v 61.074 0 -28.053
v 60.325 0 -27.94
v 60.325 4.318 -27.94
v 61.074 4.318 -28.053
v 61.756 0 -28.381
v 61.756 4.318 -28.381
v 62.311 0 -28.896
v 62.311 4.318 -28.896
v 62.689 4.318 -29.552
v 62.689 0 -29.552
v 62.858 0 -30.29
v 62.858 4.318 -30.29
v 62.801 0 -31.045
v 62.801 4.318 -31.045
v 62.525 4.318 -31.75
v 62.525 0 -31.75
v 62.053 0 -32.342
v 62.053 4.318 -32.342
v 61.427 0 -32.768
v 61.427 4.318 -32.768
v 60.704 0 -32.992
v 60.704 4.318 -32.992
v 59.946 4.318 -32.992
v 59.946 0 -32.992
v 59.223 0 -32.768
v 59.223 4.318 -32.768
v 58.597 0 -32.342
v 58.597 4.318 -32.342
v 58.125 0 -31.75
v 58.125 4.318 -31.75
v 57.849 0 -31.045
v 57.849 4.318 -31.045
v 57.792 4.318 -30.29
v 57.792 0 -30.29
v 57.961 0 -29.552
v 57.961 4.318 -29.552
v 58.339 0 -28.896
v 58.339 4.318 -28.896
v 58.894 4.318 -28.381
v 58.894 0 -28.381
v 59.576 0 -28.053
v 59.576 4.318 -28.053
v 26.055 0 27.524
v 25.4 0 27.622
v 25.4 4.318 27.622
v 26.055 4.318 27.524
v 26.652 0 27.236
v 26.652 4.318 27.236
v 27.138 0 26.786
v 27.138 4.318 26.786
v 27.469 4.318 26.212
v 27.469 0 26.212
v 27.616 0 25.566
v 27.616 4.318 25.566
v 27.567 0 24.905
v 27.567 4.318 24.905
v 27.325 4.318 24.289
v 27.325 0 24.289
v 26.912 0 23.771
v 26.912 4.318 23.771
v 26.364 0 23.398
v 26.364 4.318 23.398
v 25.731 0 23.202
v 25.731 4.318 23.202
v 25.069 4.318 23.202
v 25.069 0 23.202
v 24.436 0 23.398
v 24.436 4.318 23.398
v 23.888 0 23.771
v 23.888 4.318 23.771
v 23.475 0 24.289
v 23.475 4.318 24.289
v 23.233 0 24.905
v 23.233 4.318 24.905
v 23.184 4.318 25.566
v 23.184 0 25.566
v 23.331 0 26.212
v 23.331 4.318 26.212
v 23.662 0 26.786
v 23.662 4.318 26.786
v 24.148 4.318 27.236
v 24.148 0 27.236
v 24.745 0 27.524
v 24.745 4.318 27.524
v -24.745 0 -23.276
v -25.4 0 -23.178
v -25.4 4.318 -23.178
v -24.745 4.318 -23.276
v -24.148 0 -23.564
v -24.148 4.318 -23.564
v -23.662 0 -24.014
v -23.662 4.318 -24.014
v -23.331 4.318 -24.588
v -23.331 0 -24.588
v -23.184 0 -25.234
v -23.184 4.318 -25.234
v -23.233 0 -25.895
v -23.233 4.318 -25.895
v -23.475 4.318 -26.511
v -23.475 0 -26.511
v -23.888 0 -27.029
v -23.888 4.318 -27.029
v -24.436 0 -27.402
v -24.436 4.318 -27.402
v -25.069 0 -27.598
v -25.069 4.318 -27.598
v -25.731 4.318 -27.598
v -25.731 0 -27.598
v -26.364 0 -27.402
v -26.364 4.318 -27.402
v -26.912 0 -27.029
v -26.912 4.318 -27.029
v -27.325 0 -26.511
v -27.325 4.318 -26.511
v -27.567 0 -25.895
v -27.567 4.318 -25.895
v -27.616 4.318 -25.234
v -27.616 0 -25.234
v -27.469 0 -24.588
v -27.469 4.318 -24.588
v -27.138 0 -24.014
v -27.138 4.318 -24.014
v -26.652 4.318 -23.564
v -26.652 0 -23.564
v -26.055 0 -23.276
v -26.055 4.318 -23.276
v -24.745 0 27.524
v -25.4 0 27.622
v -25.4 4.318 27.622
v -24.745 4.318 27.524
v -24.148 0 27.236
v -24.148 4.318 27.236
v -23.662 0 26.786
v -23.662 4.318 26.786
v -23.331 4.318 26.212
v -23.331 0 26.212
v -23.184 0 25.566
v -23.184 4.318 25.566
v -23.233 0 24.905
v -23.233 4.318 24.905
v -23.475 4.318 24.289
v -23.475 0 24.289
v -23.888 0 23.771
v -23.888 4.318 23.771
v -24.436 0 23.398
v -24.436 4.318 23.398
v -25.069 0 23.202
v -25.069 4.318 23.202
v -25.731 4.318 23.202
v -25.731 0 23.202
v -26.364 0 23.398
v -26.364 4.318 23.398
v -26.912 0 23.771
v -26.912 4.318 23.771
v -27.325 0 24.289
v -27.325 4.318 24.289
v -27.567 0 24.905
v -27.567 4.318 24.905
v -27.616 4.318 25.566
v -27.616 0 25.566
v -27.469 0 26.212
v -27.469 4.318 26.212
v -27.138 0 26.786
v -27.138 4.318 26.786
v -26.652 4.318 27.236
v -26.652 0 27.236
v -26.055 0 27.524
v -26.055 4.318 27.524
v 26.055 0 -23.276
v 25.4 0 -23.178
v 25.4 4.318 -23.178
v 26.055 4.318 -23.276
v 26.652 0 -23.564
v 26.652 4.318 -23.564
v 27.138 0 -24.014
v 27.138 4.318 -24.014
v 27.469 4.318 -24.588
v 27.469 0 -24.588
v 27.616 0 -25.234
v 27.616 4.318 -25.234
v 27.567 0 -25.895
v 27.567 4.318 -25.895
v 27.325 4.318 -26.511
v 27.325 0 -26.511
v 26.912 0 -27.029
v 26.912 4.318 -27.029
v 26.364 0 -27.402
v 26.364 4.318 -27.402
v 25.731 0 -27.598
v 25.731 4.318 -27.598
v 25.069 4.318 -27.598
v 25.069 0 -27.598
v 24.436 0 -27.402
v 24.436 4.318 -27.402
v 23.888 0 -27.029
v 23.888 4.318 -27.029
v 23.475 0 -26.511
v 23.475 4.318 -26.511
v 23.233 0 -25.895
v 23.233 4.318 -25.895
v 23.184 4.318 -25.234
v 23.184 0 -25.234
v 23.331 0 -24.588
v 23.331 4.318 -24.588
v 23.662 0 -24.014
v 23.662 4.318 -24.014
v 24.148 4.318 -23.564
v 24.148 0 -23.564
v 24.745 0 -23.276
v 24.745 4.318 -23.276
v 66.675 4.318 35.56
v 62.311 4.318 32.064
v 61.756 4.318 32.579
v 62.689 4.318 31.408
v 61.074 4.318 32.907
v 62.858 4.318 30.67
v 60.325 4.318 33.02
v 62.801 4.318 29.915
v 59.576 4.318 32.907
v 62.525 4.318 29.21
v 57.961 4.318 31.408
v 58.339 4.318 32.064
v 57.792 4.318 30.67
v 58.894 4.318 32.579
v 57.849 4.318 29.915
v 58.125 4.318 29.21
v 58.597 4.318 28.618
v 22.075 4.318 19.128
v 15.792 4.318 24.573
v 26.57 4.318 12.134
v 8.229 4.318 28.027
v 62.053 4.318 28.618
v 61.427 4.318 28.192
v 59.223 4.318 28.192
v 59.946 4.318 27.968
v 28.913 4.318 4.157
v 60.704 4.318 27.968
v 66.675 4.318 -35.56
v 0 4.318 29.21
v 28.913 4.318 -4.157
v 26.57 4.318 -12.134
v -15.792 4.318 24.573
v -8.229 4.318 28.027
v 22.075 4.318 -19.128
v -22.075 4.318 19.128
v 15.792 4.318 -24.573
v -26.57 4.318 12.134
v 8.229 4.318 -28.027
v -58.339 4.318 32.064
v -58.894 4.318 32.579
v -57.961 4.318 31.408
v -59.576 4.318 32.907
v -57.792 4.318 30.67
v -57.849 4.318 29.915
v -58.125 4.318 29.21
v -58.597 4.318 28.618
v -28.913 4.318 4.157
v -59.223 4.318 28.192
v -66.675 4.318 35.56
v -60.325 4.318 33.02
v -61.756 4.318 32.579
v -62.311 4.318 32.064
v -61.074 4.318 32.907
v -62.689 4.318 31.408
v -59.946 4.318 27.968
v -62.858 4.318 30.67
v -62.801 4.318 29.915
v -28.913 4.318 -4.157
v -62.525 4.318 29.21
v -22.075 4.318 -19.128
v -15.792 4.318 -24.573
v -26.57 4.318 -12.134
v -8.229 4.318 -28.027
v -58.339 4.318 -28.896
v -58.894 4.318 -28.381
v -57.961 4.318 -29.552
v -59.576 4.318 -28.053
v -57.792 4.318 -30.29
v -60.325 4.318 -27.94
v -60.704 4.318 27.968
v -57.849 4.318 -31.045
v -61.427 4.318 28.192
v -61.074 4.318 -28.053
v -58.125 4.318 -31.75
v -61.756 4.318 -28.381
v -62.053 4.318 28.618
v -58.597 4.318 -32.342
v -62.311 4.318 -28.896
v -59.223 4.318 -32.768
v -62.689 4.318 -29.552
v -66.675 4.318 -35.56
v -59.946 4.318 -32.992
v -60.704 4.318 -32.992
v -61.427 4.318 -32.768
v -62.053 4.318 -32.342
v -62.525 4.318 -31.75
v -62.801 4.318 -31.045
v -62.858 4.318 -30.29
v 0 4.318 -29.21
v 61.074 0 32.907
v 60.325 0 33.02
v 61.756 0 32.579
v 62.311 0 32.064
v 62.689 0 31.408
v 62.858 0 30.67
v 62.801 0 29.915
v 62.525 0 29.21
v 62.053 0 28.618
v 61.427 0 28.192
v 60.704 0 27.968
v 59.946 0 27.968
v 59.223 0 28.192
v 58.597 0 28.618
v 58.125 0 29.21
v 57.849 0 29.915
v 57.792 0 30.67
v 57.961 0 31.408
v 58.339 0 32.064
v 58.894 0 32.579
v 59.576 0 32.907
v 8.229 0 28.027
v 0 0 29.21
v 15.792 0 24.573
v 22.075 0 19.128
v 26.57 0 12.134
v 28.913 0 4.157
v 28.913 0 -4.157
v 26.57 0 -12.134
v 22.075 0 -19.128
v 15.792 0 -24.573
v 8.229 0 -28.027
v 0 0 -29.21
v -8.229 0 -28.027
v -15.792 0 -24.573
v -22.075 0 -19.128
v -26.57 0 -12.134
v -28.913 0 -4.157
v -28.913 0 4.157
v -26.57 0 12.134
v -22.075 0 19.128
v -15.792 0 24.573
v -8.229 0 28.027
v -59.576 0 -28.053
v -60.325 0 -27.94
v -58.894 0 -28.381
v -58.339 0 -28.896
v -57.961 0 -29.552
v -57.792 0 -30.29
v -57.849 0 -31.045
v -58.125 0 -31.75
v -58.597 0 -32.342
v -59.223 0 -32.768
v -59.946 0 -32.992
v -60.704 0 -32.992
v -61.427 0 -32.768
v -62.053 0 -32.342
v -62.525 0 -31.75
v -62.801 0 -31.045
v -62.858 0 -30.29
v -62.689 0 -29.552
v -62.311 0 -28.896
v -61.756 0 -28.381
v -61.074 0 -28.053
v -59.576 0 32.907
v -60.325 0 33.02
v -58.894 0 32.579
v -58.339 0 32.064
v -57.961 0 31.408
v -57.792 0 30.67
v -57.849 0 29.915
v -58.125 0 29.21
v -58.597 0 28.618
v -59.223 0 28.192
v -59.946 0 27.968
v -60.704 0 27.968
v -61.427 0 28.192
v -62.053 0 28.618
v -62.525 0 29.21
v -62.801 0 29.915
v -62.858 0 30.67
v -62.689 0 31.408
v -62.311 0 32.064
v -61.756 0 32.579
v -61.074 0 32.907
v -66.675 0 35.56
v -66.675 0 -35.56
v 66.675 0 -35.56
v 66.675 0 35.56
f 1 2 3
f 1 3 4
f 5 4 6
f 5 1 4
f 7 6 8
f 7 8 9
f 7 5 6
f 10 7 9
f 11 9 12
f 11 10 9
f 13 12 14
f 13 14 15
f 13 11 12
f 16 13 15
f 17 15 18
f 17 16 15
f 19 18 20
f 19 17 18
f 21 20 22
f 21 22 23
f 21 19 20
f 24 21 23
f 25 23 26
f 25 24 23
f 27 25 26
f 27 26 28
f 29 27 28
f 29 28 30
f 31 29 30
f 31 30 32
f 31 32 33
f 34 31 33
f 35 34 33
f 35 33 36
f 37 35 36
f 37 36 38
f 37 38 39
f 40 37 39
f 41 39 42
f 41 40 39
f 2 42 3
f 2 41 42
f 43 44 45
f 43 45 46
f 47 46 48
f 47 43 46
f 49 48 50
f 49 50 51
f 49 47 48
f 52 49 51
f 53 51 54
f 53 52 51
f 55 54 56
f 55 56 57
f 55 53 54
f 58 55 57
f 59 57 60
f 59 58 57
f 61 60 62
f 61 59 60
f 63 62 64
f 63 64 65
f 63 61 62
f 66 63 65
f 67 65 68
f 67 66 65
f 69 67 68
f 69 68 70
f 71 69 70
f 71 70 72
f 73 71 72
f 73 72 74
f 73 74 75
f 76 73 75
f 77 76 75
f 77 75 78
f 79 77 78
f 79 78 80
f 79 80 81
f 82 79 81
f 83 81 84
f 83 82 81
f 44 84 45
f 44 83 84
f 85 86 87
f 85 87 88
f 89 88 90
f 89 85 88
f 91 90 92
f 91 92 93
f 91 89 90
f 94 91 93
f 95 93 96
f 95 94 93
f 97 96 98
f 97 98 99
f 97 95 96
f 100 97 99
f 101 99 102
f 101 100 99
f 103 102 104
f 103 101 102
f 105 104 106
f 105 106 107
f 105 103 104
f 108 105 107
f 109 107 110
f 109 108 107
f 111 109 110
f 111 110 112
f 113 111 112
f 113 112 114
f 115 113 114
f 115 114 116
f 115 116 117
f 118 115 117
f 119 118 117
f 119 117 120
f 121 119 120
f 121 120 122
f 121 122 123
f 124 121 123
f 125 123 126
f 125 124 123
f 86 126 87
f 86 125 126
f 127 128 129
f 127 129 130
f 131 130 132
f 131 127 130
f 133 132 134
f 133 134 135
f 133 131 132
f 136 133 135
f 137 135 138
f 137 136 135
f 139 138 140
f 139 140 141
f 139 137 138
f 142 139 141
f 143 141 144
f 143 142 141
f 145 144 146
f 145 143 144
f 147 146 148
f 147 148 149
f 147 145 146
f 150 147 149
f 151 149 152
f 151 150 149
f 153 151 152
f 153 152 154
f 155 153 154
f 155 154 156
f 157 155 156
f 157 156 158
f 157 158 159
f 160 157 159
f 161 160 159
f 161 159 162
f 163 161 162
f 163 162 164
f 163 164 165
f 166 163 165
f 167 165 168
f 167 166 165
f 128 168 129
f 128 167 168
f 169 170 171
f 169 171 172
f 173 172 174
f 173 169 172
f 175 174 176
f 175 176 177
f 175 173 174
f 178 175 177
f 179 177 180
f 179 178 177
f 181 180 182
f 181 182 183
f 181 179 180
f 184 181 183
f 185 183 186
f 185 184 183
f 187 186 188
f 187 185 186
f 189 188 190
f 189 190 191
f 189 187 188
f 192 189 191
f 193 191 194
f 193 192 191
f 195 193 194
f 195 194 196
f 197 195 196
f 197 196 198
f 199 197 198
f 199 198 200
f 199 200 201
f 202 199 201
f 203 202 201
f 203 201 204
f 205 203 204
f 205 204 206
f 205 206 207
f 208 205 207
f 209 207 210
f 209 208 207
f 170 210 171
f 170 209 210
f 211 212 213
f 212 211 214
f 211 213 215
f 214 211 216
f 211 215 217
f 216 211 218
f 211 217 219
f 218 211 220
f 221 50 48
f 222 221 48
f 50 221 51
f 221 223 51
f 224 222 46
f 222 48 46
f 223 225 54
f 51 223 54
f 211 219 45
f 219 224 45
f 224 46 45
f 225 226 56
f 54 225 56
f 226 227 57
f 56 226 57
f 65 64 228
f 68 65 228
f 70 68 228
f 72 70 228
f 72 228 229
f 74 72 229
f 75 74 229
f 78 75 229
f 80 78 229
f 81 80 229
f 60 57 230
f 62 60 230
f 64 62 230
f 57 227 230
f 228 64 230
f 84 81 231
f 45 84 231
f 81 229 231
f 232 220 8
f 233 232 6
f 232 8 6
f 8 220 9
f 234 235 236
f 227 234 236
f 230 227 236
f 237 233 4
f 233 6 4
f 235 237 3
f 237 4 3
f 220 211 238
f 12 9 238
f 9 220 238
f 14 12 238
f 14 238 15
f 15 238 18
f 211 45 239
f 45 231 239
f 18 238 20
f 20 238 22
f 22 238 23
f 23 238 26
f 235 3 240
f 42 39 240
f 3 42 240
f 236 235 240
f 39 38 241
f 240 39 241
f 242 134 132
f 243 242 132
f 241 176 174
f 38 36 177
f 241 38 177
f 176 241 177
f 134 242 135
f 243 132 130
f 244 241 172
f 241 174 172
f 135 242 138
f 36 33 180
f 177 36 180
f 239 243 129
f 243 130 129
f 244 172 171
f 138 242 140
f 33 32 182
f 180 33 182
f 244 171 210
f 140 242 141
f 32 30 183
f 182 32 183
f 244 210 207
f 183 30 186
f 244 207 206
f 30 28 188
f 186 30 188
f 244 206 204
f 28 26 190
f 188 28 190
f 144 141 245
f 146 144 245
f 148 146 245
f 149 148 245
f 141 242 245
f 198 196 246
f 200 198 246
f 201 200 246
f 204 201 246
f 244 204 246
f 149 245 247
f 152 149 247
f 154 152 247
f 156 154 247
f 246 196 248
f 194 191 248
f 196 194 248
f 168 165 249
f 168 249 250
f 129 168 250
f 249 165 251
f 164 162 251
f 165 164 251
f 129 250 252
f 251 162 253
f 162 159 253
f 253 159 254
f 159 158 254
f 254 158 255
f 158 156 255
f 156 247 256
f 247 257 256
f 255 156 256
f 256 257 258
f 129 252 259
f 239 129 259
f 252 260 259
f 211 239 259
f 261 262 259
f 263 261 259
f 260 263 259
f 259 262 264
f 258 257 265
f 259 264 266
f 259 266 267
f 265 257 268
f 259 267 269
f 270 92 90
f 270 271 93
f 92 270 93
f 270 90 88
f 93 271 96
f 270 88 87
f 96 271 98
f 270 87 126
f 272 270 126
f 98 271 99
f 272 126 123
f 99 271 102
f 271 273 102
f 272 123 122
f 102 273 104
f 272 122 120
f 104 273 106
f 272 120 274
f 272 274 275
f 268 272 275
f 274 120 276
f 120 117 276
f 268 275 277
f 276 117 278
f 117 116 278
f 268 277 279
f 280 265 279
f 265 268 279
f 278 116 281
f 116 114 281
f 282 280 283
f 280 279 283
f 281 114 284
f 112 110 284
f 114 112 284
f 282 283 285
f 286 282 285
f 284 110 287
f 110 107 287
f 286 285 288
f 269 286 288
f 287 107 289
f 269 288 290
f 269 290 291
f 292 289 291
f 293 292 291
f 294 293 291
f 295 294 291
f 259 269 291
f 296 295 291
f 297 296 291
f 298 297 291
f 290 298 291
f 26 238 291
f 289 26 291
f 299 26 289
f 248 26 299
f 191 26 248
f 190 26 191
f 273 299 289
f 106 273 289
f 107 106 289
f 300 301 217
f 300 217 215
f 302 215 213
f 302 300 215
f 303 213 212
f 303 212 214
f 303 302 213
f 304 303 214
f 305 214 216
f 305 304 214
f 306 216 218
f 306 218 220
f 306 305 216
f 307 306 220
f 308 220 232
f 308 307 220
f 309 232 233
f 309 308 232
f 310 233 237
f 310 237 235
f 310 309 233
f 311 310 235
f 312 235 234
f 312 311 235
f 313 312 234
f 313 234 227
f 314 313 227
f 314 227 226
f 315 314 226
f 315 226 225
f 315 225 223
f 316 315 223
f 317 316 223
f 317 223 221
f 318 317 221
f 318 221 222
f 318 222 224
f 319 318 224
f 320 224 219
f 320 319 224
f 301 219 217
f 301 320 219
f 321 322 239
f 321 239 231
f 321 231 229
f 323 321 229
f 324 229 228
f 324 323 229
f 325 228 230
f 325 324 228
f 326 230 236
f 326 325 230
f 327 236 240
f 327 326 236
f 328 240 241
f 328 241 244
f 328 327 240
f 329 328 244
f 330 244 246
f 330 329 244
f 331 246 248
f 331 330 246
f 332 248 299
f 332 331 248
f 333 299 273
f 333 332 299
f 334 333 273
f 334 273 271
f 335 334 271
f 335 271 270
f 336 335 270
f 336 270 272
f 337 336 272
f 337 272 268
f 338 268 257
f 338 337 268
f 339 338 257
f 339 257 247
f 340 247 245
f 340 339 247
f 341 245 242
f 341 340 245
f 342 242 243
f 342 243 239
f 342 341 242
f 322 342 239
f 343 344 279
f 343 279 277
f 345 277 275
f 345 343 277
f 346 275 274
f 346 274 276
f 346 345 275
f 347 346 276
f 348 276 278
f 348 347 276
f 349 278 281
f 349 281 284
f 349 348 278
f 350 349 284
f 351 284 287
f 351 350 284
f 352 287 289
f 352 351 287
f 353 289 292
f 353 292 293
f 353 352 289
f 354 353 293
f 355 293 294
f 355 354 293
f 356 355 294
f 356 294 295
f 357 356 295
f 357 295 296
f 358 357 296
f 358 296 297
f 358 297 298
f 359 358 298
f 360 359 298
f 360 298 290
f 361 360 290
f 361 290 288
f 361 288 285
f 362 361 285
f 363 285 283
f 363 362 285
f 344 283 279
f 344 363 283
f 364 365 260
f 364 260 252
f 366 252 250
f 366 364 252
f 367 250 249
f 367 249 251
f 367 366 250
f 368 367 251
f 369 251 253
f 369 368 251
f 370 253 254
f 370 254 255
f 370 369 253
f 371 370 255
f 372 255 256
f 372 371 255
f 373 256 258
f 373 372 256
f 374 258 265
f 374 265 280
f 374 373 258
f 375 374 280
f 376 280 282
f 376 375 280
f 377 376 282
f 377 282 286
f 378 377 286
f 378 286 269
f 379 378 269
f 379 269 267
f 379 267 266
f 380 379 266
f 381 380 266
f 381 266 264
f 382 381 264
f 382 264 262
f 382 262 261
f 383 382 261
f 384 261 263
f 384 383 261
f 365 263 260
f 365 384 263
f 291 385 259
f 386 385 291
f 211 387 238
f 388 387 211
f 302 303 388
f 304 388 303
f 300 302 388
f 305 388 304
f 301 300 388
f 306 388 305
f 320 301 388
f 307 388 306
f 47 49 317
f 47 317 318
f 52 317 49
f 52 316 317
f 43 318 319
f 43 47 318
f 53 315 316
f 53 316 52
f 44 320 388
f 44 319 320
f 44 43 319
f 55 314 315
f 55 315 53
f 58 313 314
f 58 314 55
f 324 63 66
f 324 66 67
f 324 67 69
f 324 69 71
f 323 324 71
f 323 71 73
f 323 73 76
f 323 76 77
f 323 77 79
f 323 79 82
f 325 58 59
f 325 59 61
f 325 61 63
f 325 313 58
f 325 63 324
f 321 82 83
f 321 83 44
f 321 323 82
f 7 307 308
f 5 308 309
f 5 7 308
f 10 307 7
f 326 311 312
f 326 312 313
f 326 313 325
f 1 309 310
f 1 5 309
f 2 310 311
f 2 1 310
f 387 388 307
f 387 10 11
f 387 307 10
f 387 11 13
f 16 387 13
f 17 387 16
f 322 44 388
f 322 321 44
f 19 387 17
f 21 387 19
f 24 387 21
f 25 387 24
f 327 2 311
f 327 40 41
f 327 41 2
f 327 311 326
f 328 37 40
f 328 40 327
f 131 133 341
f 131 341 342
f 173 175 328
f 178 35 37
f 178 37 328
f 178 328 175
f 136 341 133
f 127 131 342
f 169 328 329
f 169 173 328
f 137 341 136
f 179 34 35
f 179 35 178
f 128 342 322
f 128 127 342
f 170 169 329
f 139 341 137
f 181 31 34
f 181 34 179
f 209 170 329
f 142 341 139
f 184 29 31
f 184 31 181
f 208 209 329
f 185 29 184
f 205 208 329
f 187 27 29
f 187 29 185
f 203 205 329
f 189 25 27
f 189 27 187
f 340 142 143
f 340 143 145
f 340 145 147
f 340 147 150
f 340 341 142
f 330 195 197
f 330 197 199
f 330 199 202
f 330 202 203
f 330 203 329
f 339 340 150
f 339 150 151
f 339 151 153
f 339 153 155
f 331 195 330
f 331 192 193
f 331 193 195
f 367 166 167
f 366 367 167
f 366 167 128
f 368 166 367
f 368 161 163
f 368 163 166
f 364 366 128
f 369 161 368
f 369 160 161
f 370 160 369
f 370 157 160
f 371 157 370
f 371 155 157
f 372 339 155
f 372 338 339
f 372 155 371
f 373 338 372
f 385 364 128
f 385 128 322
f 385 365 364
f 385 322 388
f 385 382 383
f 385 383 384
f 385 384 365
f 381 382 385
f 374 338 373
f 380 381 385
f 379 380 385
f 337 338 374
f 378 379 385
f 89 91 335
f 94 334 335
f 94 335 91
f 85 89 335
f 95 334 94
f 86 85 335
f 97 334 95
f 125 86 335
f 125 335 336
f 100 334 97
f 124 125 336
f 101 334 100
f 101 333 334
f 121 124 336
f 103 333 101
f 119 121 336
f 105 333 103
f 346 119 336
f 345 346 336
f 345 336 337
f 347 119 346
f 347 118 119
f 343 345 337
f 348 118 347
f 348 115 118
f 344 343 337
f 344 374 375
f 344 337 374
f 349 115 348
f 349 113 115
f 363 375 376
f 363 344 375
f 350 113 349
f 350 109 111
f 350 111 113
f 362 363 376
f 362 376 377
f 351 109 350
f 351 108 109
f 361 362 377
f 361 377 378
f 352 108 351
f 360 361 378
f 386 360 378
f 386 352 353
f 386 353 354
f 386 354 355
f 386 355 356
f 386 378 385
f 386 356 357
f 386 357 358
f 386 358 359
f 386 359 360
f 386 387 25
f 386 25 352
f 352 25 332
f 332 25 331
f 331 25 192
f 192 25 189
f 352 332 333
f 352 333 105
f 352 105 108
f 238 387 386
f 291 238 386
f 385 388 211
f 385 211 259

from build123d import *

# Parameters (mm, degrees)
SKETCH1_R           = 2.2225
BOSS_EXTRUDE1_DEPTH = 4.318


with BuildPart() as part:
    # Sketch1 → Boss-Extrude1 (new body)
    with BuildSketch(Plane(origin=(0, 0, 0), x_dir=(1, 0, 0), z_dir=(0, 1, 0))):
        Polygon((66.675, 35.56), (0, 35.56), (-66.675, 35.56), (-66.675, -35.56), (66.675, -35.56), align=None)
        with BuildLine():
            ThreePointArc((-57.785, -30.48), (-62.121051224, -32.276051224), (-60.325, -27.94))
            ThreePointArc((-60.325, -27.94), (-58.528948776, -28.683948776), (-57.785, -30.48))
        make_face(mode=Mode.SUBTRACT)
        with Locations((-25.4, -25.4)):
            Circle(SKETCH1_R, mode=Mode.SUBTRACT)
        with Locations((25.4, -25.4)):
            Circle(SKETCH1_R, mode=Mode.SUBTRACT)
        with BuildLine():
            ThreePointArc((62.865, -30.48), (58.528948776, -32.276051224), (60.325, -27.94))
            ThreePointArc((60.325, -27.94), (62.121051224, -28.683948776), (62.865, -30.48))
        make_face(mode=Mode.SUBTRACT)
        with BuildLine():
            ThreePointArc((29.21, 0), (0, -29.21), (-29.21, 0))
            ThreePointArc((-29.21, 0), (0, 29.21), (29.21, 0))
        make_face(mode=Mode.SUBTRACT)
        with BuildLine():
            ThreePointArc((-57.785, 30.48), (-58.528948776, 28.683948776), (-60.325, 27.94))
            ThreePointArc((-60.325, 27.94), (-62.121051224, 32.276051224), (-57.785, 30.48))
        make_face(mode=Mode.SUBTRACT)
        with Locations((-25.4, 25.4)):
            Circle(SKETCH1_R, mode=Mode.SUBTRACT)
        with Locations((25.4, 25.4)):
            Circle(SKETCH1_R, mode=Mode.SUBTRACT)
        with BuildLine():
            ThreePointArc((62.865, 30.48), (62.121051224, 28.683948776), (60.325, 27.94))
            ThreePointArc((60.325, 27.94), (58.528948776, 32.276051224), (62.865, 30.48))
        make_face(mode=Mode.SUBTRACT)
    extrude(amount=BOSS_EXTRUDE1_DEPTH)


solid = part.part
